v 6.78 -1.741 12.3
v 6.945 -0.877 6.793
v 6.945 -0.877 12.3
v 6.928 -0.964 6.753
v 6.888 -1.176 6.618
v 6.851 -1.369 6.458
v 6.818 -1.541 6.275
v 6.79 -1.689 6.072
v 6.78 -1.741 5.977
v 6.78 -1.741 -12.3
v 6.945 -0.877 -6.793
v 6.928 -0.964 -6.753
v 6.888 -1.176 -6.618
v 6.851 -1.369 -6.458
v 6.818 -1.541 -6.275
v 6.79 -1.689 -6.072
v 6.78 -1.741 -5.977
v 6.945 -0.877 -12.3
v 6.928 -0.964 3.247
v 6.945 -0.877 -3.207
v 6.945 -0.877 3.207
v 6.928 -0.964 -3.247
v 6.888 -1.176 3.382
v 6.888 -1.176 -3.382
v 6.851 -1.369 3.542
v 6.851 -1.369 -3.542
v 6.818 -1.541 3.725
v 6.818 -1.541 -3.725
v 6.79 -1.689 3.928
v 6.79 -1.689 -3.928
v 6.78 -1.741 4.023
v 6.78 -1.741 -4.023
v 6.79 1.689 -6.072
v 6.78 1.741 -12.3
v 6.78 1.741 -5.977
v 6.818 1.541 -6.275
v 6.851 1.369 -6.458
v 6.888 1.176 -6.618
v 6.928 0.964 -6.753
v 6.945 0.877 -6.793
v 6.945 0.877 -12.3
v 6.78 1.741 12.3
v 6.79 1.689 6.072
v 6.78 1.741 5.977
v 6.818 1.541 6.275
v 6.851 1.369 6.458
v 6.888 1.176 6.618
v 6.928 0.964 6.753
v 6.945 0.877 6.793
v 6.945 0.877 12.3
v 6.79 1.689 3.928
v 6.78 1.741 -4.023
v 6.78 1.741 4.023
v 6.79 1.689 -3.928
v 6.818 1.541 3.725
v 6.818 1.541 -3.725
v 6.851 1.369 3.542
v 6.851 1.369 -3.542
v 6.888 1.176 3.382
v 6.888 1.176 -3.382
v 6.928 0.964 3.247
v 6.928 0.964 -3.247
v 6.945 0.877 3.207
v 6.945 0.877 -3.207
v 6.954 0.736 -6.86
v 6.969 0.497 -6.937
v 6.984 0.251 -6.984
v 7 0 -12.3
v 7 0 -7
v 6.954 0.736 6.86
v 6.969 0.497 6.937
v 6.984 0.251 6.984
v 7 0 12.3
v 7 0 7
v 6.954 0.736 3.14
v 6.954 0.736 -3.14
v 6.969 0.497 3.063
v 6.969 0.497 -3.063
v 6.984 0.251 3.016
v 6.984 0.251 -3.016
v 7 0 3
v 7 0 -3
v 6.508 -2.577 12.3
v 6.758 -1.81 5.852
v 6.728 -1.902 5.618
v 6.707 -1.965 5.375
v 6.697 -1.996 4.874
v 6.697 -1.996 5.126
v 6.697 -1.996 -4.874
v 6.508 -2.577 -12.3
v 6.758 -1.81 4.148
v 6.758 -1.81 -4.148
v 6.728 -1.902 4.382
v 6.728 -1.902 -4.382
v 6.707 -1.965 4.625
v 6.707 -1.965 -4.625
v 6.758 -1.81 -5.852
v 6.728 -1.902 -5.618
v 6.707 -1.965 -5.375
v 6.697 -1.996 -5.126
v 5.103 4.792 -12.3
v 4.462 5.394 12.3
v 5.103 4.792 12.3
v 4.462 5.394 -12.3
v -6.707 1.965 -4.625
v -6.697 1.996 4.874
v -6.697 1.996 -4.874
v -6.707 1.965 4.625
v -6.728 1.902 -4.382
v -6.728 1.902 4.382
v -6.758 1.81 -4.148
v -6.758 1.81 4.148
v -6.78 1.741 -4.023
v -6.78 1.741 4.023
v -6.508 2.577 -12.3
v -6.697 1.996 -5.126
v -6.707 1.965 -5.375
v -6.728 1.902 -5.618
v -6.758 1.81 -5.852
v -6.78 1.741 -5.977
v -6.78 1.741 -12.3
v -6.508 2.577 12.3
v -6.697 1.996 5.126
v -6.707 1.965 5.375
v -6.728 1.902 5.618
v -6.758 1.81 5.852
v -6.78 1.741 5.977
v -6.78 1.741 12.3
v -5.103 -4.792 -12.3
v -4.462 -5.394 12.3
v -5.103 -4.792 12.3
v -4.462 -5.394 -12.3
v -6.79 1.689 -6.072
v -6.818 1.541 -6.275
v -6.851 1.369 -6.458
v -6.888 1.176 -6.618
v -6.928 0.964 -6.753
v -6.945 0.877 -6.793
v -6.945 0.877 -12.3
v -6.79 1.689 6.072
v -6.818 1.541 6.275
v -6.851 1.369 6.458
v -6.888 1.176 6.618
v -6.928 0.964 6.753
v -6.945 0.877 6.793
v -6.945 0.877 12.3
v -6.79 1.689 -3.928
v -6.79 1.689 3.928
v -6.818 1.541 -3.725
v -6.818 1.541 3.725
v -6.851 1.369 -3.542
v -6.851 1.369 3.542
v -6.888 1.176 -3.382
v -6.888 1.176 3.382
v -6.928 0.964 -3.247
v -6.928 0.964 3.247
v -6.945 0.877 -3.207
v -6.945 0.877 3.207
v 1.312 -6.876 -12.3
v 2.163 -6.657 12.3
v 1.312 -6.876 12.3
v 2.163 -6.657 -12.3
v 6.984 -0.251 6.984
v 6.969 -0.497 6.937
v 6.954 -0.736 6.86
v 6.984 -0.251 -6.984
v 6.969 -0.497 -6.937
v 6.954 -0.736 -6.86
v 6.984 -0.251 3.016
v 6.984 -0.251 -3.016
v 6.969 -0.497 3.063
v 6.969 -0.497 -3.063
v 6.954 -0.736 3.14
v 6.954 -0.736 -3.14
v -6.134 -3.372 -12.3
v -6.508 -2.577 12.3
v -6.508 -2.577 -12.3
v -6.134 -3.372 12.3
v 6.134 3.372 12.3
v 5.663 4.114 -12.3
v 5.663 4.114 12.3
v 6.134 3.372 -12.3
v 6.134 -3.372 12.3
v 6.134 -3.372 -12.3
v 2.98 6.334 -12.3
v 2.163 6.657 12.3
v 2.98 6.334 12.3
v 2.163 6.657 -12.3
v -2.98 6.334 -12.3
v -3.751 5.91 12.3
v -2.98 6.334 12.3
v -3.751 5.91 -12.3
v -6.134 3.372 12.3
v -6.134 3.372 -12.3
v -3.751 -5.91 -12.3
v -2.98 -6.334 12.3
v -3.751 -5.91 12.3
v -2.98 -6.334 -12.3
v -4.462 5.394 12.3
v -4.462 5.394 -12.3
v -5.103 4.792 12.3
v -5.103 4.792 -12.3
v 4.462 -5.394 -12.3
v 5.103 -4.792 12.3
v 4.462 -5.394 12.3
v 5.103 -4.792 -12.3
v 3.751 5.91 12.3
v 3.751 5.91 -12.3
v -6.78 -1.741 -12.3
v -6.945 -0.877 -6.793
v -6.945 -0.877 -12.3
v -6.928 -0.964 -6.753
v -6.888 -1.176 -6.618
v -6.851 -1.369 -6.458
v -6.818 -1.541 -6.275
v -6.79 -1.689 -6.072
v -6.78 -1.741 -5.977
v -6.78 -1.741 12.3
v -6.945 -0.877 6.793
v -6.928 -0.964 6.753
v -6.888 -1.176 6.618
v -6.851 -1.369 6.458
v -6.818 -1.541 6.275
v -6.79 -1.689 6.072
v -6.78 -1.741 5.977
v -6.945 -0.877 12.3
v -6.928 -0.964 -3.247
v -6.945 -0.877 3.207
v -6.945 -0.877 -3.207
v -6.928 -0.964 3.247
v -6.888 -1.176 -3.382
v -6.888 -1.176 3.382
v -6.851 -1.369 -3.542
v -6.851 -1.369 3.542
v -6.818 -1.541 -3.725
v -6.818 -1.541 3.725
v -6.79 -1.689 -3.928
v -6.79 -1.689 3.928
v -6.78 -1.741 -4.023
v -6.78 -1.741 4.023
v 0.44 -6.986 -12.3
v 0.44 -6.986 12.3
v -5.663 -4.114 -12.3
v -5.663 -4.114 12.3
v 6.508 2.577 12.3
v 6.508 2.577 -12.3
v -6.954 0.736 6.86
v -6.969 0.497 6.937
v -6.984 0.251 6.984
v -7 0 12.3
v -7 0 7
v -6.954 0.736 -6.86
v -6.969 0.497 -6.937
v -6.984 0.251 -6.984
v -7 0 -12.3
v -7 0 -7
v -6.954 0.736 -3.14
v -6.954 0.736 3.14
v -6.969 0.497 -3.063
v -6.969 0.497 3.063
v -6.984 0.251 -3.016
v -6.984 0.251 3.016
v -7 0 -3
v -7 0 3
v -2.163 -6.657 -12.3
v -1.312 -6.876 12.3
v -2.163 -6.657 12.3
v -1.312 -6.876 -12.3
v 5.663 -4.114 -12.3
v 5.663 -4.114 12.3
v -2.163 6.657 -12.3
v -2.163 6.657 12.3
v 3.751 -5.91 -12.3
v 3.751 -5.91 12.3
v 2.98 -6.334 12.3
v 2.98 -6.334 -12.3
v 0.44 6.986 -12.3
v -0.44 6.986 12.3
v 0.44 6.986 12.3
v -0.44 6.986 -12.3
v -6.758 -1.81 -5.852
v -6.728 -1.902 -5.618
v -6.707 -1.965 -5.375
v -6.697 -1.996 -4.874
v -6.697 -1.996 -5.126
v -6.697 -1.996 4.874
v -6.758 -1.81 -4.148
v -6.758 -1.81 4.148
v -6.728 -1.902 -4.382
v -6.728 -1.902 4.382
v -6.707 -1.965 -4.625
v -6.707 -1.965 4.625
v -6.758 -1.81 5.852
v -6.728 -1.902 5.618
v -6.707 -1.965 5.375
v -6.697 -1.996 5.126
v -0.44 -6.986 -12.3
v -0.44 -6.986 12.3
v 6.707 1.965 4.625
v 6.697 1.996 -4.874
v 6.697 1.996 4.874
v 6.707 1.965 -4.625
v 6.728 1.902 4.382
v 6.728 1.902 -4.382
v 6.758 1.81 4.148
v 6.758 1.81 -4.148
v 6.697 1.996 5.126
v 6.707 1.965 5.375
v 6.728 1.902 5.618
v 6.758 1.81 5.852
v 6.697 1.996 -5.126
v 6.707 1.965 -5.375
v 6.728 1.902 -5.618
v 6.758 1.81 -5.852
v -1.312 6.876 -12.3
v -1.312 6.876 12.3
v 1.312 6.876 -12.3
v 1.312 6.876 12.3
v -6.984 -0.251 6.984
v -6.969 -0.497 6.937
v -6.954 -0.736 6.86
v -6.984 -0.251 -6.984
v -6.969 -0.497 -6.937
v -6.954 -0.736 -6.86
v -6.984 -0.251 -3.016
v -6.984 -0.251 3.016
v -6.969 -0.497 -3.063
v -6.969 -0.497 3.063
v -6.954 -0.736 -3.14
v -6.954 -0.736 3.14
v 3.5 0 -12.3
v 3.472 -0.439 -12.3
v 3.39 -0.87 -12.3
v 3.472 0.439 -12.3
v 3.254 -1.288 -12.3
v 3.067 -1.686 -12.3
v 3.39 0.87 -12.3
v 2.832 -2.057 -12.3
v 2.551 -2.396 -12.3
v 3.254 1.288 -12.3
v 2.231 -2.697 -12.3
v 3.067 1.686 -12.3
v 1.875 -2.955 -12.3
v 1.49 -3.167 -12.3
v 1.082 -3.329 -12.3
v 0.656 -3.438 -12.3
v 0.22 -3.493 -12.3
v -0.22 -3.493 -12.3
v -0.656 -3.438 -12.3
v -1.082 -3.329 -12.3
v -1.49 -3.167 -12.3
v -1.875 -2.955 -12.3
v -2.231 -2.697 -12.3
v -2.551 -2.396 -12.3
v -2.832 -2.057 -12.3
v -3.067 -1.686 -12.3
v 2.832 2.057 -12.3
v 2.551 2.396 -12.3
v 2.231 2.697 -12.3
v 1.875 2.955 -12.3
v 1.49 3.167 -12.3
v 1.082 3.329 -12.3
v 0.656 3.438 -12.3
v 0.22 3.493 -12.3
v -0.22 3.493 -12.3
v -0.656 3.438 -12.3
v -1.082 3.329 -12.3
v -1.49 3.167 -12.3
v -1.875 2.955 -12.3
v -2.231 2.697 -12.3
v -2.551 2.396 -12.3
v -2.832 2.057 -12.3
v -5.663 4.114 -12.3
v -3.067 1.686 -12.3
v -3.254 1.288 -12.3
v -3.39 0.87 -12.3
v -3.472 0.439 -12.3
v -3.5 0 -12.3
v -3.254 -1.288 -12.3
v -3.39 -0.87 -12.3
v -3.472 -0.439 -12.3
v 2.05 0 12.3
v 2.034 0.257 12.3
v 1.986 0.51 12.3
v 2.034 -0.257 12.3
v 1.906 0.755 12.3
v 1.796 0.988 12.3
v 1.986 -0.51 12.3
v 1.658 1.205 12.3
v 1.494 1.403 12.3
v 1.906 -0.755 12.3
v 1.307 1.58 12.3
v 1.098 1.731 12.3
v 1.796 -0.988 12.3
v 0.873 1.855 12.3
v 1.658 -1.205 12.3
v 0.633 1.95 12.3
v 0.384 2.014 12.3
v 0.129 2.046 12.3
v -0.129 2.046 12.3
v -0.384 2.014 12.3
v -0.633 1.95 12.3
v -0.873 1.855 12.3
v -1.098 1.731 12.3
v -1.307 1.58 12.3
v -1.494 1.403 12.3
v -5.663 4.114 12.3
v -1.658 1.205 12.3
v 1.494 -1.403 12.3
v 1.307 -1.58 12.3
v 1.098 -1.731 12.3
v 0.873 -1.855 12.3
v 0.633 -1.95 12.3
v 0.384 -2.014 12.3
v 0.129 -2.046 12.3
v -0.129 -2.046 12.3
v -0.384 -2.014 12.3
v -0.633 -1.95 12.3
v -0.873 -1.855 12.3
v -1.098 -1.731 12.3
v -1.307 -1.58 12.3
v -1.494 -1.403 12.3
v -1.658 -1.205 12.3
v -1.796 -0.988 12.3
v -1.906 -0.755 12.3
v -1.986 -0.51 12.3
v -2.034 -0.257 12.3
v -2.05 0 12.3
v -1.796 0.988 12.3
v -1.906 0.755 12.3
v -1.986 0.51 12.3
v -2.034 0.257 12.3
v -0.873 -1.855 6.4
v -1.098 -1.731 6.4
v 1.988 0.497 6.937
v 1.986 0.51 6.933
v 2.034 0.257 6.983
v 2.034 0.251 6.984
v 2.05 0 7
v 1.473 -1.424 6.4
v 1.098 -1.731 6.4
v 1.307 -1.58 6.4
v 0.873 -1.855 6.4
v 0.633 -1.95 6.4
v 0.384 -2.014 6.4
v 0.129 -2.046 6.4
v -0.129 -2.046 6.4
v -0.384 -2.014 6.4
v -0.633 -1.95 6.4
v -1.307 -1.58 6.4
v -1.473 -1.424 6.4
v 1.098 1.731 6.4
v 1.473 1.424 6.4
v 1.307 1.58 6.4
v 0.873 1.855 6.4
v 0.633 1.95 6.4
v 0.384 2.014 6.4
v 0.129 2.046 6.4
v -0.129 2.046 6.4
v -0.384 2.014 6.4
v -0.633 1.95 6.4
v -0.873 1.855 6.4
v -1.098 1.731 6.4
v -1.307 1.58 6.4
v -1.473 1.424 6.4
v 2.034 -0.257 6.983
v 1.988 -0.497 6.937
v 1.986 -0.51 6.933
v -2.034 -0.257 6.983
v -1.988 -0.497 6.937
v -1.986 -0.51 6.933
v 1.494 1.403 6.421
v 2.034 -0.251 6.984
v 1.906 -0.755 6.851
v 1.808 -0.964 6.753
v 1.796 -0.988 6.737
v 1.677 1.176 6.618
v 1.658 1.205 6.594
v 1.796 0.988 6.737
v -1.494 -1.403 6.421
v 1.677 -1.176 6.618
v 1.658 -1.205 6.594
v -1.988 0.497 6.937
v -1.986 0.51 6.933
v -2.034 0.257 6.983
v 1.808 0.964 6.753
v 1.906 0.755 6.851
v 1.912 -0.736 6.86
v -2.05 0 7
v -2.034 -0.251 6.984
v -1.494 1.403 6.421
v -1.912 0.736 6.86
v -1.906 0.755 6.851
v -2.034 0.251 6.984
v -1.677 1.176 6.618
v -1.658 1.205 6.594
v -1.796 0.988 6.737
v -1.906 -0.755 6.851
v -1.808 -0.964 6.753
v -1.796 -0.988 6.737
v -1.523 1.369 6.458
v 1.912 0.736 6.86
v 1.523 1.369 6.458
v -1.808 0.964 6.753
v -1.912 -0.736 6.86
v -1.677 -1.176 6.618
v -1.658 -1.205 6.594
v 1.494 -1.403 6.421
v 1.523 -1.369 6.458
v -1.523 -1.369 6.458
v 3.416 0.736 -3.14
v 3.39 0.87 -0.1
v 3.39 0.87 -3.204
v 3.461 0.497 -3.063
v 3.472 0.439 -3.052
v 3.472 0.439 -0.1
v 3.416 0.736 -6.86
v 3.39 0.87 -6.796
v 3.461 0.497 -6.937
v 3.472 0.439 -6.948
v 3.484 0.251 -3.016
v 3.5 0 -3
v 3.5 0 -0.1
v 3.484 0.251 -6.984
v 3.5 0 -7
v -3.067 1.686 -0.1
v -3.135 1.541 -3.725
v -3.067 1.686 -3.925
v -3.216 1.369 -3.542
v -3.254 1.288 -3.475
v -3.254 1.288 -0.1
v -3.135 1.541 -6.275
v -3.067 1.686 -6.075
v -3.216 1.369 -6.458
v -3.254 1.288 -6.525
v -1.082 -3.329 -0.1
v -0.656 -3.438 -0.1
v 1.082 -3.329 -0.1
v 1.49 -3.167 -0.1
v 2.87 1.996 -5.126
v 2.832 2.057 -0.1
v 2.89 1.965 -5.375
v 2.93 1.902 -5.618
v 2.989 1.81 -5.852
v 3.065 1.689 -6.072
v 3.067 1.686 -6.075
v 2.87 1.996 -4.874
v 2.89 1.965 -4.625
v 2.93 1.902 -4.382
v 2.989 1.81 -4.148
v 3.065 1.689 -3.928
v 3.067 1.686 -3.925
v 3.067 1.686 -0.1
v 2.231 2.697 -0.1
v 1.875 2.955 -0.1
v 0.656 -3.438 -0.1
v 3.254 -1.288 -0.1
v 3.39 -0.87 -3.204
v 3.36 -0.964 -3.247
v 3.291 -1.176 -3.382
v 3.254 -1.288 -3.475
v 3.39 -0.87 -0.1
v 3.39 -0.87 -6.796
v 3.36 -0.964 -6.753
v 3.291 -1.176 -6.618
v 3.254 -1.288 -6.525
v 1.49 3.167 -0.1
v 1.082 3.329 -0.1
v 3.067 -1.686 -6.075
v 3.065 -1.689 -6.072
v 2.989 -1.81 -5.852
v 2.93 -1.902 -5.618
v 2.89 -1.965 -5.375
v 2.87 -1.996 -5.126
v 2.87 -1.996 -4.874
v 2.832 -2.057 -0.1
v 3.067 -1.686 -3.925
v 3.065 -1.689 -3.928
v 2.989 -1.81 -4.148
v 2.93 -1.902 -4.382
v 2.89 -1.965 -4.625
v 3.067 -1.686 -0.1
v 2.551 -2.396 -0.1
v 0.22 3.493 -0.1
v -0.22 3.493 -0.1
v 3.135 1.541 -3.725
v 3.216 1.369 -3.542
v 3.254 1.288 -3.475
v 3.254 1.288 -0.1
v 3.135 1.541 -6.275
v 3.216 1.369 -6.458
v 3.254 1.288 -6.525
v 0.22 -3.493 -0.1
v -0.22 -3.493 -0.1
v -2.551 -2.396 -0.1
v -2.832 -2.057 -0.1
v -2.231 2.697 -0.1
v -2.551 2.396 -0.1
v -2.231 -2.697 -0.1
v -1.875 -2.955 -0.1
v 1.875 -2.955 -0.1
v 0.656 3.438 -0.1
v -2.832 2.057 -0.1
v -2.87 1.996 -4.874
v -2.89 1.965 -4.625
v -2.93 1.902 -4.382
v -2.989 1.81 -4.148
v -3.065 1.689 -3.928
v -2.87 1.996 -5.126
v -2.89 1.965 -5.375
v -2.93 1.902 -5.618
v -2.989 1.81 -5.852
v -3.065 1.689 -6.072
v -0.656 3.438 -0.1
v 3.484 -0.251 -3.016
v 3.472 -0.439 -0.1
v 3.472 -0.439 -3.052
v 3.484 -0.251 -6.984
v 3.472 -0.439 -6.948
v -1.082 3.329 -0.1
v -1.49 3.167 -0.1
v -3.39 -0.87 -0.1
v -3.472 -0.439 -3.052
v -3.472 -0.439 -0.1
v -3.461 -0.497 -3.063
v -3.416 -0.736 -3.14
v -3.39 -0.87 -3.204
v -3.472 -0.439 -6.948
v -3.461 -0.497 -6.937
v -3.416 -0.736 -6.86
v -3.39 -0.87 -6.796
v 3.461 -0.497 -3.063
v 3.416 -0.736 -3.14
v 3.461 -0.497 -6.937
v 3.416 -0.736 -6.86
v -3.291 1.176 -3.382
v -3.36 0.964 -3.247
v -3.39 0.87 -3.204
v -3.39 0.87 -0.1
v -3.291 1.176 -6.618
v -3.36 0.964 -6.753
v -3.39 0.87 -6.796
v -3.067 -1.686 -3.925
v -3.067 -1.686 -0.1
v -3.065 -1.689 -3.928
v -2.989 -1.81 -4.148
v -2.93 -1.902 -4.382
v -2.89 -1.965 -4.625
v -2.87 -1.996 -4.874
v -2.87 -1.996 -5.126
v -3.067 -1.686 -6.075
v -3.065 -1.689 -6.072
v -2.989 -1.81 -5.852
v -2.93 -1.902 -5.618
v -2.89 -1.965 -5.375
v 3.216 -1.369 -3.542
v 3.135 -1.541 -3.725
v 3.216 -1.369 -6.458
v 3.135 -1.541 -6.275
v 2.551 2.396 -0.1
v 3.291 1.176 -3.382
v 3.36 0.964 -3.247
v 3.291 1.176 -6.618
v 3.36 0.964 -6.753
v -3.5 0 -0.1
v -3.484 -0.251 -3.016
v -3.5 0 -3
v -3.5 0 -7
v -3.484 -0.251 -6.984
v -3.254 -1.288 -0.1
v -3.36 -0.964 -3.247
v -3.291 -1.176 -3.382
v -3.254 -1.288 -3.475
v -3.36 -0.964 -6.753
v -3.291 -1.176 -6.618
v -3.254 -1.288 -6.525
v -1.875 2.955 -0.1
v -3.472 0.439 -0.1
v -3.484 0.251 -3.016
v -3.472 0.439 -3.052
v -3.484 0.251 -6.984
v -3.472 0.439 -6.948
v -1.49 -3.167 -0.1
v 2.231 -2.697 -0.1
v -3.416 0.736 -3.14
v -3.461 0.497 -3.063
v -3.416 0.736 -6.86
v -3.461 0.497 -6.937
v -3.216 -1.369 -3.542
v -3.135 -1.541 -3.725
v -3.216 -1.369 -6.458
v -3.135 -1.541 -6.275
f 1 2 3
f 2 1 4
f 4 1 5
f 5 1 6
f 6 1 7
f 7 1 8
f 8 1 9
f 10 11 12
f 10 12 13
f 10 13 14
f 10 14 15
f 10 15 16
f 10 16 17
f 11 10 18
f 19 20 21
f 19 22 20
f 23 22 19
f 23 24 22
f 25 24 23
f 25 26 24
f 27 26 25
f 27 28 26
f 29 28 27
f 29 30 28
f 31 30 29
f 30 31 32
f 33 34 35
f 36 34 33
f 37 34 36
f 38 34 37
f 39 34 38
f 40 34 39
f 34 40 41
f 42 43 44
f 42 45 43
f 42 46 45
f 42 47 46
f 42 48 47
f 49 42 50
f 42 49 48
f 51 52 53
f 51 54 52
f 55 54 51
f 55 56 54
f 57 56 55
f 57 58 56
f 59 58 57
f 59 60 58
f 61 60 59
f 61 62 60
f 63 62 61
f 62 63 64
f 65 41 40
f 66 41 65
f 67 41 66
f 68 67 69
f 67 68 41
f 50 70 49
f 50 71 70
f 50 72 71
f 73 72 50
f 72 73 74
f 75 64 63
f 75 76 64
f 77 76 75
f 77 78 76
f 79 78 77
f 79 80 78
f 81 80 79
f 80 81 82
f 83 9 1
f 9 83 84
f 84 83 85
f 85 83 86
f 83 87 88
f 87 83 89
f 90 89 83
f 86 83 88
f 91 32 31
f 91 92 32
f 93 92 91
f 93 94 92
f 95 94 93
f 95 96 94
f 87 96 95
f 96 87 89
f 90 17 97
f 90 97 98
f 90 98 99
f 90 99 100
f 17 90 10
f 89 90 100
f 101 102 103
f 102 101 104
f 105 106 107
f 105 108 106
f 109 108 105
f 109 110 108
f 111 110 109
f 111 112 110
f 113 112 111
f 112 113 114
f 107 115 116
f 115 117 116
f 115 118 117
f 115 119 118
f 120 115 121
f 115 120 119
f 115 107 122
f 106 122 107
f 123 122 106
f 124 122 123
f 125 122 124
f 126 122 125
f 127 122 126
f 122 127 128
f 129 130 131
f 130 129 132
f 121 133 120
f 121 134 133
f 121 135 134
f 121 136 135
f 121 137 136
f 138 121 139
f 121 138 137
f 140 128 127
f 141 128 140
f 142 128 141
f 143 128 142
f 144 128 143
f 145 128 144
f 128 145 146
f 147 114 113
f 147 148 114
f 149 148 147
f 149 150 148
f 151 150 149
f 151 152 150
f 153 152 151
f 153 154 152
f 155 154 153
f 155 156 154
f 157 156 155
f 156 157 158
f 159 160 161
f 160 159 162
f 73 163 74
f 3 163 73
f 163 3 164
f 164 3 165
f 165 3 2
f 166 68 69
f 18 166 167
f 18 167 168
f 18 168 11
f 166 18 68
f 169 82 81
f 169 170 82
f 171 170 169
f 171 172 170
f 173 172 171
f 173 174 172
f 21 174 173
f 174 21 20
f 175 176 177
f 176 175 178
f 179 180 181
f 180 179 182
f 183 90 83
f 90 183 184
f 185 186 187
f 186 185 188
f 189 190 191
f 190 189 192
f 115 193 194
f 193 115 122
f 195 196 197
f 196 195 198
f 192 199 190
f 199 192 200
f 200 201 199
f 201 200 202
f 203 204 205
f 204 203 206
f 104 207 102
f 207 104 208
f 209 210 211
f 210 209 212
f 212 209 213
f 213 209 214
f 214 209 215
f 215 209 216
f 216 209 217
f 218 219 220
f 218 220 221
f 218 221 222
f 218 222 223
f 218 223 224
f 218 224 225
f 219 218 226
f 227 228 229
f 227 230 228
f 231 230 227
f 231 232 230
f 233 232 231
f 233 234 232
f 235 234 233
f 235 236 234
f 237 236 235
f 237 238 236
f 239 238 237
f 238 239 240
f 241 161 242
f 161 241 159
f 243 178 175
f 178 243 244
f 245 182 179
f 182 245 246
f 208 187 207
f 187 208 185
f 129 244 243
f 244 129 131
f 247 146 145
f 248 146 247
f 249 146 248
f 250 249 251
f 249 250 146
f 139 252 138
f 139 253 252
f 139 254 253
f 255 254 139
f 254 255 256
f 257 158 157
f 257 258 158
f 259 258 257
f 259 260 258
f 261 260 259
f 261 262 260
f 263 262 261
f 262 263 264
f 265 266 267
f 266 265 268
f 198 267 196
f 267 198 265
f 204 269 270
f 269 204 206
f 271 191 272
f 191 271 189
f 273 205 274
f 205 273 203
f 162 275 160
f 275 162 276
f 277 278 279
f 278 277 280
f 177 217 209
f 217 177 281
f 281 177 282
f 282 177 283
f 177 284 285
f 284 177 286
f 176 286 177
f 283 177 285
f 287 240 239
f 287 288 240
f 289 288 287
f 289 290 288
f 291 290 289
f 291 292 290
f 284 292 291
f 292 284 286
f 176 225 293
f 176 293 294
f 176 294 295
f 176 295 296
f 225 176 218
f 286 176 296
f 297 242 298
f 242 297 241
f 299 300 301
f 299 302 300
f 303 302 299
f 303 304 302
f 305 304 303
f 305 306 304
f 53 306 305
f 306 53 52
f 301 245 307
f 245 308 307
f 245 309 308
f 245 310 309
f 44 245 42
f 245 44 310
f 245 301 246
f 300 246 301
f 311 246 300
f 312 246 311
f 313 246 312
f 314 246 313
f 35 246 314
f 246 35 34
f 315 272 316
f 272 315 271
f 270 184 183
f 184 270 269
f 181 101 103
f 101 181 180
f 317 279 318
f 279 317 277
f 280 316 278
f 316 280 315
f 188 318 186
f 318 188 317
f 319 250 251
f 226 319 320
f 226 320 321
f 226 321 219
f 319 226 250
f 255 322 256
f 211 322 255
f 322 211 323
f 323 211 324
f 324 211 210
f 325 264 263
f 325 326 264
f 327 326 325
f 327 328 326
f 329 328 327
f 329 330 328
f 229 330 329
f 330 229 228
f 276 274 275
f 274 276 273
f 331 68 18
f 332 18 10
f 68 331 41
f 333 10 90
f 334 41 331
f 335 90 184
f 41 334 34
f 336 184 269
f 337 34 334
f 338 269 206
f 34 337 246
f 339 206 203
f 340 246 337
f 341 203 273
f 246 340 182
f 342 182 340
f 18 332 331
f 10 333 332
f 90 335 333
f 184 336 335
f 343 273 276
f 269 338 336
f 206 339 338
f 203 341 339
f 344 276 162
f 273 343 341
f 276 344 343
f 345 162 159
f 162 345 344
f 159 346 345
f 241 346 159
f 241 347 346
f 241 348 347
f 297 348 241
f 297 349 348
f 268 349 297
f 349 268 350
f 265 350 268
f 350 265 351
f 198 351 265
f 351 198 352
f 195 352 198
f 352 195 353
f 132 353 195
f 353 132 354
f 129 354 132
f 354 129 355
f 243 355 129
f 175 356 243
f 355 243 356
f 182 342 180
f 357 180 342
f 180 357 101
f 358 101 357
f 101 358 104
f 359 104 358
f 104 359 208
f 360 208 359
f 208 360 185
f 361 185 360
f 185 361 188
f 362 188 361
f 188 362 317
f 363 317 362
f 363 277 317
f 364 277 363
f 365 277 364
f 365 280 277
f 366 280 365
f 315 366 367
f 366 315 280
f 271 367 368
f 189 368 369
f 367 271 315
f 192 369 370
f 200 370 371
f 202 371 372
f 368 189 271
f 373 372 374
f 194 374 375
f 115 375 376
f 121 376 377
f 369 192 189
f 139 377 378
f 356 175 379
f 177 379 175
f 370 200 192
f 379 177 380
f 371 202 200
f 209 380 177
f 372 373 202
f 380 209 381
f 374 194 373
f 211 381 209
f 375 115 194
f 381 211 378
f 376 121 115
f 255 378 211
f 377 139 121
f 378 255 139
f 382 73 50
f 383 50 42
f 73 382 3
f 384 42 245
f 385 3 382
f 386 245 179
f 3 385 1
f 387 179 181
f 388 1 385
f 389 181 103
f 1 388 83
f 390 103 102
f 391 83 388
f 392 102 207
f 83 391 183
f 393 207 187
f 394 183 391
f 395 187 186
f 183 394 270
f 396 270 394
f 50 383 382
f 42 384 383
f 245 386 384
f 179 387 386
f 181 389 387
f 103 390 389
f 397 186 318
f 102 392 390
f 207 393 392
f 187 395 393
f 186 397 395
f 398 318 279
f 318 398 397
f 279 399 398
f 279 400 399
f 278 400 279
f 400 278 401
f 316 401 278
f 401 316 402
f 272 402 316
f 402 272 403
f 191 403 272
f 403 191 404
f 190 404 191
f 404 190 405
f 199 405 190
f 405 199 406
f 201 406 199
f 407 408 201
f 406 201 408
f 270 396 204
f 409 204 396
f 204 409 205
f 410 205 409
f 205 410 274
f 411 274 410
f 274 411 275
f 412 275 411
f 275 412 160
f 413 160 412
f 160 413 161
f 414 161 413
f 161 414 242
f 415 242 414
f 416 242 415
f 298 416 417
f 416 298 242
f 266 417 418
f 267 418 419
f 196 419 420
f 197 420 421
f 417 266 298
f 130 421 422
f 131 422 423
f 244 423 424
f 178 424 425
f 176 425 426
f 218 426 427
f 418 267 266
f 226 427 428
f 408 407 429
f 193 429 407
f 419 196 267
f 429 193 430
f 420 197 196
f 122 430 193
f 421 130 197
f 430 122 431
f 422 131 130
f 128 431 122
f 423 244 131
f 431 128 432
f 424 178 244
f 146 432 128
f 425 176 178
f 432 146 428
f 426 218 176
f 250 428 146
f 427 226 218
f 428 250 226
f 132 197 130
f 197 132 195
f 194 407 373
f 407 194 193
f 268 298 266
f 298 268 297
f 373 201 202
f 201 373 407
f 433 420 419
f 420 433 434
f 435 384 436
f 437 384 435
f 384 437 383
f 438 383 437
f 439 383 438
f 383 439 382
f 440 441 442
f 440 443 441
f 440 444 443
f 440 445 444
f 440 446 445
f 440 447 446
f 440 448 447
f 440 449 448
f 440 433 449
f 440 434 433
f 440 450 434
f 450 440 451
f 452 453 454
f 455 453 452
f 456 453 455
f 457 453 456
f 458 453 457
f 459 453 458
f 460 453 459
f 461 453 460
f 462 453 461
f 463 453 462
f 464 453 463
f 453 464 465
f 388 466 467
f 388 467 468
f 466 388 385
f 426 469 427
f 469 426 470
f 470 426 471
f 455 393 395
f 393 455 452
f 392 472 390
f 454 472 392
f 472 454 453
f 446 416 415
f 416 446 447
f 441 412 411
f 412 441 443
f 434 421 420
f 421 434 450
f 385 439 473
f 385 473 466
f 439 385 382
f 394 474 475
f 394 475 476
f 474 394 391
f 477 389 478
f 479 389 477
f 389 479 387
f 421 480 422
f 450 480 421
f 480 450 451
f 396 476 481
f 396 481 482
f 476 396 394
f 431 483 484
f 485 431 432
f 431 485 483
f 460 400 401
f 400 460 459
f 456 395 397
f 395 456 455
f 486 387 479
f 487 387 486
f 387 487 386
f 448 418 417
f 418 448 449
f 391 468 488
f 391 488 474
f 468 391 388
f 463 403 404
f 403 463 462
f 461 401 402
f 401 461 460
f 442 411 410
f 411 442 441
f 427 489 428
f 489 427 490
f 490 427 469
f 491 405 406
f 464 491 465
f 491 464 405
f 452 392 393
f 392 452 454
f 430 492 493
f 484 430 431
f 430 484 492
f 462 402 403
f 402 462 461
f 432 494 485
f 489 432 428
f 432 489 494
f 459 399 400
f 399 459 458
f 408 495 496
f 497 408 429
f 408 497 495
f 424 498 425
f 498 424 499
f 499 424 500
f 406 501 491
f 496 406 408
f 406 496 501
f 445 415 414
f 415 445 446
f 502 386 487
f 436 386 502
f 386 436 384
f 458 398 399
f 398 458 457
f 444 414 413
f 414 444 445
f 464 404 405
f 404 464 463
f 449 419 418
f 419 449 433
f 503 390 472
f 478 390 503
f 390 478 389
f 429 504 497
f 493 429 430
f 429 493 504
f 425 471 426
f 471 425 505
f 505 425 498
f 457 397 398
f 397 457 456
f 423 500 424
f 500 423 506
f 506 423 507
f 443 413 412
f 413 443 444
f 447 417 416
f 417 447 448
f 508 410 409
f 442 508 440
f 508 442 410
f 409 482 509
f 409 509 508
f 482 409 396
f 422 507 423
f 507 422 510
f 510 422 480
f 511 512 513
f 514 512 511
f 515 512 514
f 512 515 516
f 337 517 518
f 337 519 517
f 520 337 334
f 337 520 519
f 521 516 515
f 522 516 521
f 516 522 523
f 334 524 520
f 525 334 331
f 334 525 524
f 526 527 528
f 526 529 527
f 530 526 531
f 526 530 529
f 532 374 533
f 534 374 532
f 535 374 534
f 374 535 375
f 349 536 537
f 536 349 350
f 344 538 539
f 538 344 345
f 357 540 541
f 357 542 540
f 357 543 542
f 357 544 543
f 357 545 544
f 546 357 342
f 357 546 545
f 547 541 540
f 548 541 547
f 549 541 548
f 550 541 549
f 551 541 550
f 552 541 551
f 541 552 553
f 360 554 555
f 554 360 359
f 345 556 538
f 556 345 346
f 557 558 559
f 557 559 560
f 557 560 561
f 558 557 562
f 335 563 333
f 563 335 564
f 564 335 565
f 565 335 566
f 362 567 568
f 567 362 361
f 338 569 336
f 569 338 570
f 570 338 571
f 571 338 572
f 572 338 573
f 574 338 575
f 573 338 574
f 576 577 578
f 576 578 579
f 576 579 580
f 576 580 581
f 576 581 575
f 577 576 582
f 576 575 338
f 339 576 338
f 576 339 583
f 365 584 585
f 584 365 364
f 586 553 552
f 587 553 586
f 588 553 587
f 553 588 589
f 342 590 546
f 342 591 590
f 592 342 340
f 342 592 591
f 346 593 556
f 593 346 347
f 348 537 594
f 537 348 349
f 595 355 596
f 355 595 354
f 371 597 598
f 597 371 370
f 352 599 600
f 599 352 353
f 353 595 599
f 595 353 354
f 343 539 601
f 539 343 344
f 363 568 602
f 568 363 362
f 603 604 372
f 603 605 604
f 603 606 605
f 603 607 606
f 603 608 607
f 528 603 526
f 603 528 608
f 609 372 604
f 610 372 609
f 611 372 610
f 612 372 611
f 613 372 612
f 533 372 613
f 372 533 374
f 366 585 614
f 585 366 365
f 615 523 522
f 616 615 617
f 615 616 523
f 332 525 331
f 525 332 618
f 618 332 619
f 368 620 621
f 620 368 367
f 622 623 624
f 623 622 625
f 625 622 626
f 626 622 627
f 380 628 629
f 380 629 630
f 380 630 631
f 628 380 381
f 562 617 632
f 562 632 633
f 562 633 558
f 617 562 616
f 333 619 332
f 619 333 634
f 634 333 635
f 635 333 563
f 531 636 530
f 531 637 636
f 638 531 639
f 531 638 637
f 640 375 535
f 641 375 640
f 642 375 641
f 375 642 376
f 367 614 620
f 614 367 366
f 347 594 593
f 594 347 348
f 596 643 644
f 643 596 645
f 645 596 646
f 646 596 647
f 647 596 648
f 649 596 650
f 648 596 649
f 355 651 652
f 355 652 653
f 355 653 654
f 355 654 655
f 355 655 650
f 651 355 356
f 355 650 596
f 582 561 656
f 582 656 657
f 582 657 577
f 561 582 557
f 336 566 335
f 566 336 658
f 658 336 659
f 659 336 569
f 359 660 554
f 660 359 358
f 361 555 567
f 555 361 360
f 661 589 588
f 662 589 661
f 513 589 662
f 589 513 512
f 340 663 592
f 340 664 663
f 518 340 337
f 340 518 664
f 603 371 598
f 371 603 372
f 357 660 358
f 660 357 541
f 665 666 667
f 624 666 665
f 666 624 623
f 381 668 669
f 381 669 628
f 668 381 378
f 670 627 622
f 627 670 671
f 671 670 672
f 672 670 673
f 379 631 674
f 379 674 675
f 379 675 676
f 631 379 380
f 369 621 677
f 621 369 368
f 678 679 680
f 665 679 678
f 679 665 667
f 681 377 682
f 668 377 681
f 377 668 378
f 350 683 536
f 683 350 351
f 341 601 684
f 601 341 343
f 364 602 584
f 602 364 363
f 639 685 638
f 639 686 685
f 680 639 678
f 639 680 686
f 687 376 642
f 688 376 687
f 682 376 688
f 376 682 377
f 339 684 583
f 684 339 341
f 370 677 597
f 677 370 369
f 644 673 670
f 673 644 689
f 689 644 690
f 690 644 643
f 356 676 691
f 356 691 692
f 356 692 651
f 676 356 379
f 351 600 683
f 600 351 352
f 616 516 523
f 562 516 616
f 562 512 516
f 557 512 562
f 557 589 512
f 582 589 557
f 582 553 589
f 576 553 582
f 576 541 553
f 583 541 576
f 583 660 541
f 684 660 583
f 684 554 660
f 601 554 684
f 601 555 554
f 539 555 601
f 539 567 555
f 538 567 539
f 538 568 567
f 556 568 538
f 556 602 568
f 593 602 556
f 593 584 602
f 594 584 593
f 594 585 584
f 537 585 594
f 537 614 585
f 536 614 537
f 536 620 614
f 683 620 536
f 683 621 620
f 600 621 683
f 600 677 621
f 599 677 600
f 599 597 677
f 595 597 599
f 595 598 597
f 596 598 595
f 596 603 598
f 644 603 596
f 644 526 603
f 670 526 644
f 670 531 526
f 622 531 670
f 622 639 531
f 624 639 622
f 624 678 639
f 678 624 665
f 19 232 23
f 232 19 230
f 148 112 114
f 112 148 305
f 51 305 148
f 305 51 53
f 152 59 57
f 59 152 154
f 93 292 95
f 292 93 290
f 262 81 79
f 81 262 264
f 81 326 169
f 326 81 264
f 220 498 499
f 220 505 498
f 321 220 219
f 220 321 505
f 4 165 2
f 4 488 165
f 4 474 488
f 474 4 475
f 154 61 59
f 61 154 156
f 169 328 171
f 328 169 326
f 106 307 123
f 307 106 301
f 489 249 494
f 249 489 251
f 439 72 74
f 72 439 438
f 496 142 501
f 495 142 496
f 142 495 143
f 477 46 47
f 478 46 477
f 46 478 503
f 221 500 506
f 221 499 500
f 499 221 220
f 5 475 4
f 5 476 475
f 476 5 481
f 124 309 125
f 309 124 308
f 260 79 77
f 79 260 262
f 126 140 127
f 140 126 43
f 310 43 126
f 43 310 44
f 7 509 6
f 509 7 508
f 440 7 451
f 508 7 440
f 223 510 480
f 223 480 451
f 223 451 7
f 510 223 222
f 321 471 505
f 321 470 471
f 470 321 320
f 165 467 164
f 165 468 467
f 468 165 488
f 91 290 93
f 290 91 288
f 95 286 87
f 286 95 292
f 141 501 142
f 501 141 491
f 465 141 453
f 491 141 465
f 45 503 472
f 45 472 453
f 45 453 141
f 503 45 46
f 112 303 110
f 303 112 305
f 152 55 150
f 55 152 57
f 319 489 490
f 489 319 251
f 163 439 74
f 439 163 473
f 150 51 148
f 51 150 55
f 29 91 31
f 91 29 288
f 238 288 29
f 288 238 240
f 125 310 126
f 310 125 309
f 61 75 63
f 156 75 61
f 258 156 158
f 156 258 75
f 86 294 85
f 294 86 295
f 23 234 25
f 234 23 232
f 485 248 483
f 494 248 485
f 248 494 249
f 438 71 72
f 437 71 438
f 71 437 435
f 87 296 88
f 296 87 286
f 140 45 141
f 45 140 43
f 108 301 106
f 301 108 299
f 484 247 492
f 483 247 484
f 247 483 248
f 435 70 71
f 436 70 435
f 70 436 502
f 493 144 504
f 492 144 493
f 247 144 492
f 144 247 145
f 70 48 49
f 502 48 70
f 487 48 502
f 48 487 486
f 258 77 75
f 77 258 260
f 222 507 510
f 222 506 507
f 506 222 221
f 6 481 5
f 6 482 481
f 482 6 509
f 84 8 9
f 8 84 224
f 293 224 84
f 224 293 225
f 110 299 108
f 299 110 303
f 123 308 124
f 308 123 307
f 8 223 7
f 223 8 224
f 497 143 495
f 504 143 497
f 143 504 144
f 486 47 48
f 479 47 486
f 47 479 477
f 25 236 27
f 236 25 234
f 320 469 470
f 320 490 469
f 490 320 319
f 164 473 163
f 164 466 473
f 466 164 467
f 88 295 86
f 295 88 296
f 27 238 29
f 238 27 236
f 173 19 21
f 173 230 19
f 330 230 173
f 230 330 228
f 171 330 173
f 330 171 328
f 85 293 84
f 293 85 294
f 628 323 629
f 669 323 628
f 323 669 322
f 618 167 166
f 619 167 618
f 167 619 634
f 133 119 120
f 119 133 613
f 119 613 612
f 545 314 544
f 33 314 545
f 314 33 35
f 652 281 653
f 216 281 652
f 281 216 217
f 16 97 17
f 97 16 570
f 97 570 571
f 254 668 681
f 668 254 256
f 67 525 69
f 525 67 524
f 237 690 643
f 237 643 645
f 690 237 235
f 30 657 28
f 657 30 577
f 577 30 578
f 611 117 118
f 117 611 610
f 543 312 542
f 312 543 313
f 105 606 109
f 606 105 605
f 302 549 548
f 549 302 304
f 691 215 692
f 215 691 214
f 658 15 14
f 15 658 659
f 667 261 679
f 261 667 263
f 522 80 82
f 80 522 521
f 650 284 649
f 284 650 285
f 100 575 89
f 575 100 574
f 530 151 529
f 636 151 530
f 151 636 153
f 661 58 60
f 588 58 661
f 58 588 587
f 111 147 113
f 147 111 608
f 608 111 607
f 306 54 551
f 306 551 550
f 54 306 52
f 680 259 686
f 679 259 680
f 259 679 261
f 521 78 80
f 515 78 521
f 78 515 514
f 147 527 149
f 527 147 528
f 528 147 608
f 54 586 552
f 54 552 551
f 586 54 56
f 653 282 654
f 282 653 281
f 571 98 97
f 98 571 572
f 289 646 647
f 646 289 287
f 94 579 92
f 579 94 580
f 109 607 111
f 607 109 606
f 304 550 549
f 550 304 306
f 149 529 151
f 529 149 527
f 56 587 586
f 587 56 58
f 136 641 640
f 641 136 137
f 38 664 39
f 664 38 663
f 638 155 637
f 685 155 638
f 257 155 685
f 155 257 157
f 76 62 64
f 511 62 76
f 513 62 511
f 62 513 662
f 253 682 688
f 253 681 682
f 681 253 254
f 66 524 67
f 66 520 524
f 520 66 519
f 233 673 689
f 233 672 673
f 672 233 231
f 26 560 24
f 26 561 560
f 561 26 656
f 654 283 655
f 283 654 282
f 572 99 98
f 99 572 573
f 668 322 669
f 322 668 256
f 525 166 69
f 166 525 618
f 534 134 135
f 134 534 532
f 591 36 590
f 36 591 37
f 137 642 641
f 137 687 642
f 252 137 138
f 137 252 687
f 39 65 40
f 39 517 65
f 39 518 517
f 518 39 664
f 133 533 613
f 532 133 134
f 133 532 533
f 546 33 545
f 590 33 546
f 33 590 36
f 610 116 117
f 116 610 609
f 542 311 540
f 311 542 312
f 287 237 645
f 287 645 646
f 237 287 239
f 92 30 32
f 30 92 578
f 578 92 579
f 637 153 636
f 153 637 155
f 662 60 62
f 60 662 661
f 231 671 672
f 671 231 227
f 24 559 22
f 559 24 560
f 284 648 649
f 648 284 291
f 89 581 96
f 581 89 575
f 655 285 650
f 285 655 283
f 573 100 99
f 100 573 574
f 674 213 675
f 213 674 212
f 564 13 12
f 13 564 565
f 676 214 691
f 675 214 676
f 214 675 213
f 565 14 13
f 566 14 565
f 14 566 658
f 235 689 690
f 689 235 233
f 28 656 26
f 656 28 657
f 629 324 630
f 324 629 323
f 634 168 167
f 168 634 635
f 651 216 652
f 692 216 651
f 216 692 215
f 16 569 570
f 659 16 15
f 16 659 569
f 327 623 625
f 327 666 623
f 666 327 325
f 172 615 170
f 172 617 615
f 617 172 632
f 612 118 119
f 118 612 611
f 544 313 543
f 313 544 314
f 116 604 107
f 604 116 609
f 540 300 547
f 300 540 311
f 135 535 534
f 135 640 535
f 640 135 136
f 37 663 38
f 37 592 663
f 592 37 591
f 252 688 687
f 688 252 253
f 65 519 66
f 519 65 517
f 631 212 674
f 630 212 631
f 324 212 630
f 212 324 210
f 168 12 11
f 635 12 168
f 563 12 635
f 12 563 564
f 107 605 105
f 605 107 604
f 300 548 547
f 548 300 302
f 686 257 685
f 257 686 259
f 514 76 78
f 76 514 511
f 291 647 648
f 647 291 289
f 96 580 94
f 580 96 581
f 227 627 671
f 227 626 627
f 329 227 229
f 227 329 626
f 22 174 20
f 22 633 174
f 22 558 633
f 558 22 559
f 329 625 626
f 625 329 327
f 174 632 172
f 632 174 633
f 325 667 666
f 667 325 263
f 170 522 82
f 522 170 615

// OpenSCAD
// file: ../robot_settings.scad
main_box_x = 95; // 96
main_box_y = 102;
main_box_z = 74; // 74.5
wall_thickness = 2;

rail_gap = 2;
rail_inset = 7;

rail_thickness = 7;
rail_length = 250;
rail_width = 200;

raspberry_pi_screw_seperation_y = 57;
raspberry_pi_screw_seperation_z = 48;
raspberry_pi_peg_h = 4;

gears_module = 1;
pinion_gear_teeth = 30;
pinion_gear_width = 5;
pinion_gear_bore = 4;

gears_setback_distance = 25;
gear_post_height = 2 * pinion_gear_width + rail_thickness + 8 ;

steering_motor_mount_x = 45;
steering_motor_mount_y = 36;
steering_motor_mount_z = 18;
steering_motor_mount_setback_distance = gears_setback_distance + 16;

dc_motor_drivertype = "Teyleten"; // Teyleten
isAdafruit = (dc_motor_drivertype == "Adafruit");

drv8871_x = isAdafruit ? 20.3 : 21.6;
drv8871_y = isAdafruit ?  24 : 25;

drv8871_z = 2;
drv8871_screw_d = 2.5;
drv8871_solder_points_z = 2;

drv8871mount_edge_x = 1.5;
drv8871mount_edge_wall = 3;
drv8871mount_z = 5;
drv8871mount_x = drv8871_x +  drv8871mount_edge_wall - 2* drv8871mount_edge_x;
drv8871mount_y = 19;

drv8871_screw_distance = 15.64;
drv8871_solder_points_d = 1.66;
drv8871_solder_offset_y = 4.4;
drv8871_solder_inner_points_distance = 5;
drv8871_solder_outer_points_distance = 12;

dc_motor_housing_minus_encoder_z = 48;
dc_motor_encoder_z = 9.33;
dc_motor_encoder_wheel_d = 13.4;
dc_motor_encoder_wheel_thickness = 5;
dc_motor_encoder_wheel_gap = 3;
dc_motor_encoder_circuit_thickness = 2;
dc_motor_cutout_d = 24.8;
dc_motor_cutout_z = 19.5;

dc_motor_screw_head_z = 2;
dc_motor_screw_head_d = 5.6;
dc_motor_screw_d = 3.2;
dc_motor_screw_offset = 8.5;

dc_motor_axle_ring_z = 3;
dc_motor_axle_ring_d = 7.2;
dc_motor_axle_cutout_d = 4.5;
dc_motor_axle_cutout_z = 10;
dc_motor_axle_notch_cutout = 0.4;
dc_motor_axle_notch_cutout_z = 6;

pdmount_x = 20;
pdmount_y = 30;
pdmount_z = 2;
pdmount_edge_x = 1.5;
pdmount_edge_wall = 3;

steering_shaft_z = 45;
steering_shaft_d = 7;
steering_shaft_motor_fitting_d = 9;
coupler_length = 24.6;
coupler_diameter = 14;
coupler_screw_d = 4;
coupler_screw_z_offset = 5;
coupler_gear_side_insert = 12.6;
steering_shaft_with_coupler_z = steering_shaft_z - coupler_gear_side_insert;

lidar_mount_y = 110;
lidar_mount_x = 65 + 20;
lidar_narrow_screws = 40;
lidar_wide_screws = 56;
lidar_front_to_back_screws = 70;
lidar_screw_d = 3;
lidar_circuitboard_x = 20;
lidar_circuitboard_y = 35;
lidar_circuitboard_z = 1.2;
lidar_cord_length = 29;

ball_bearing_height = 7;
ball_bearing_outer_diameter = 22;
ball_bearing_inner_diameter = 8;

pull_bar_radius = 3.3;

rack_module = 1;
rack_length = main_box_x / 2;
rack_height = 10;
rack_width = 10;
rack_teeth = 30;
rack_bore = 3;

// tire hardware
axle_length = 30;
axle_reciever_inner_diameter = 7.75;
axle_reciever_length = 18.8;
axle_notch_length = 7;
axle_notch_cutout = 2.4;

// power distribution bar
power_bar_cutout_x = 96;
power_bar_y = 19.1;
power_bar_z = 1.5;
power_bar_screw_distance = 91.4;
power_bar_screw_d = 2.8;
power_bar_standoff_z = 5;
power_bar_standoff_d = 6.83;

// breadboard
breadboard_wall_thickness = 3;
breadboard_width = 55;
breadboard_length = 83;
breadboard_height = 10.5;
breadboard_notch_width = 3.8;
breadboard_longside_notch_separation = 58.2 - breadboard_notch_width / 2;
breadboard_shortside_notch_separation = 26.3 - breadboard_notch_width;

pico_expander_width = 63;
pico_expander_height = 57;
pico_screw_hole_offset = 3;
pico_screw_hole_d = 2.5;
// main file
$fn = 50;
include <../robot_settings.scad>


  module steering_coupler() {
  color("blue")
  difference() {
    cylinder(h = coupler_length, d = coupler_diameter, center = true);

    // top cutout for motor axle
    translate([0, 0, coupler_length / 2 - dc_motor_axle_notch_cutout_z / 2 + .1])
    cylinder(h = dc_motor_axle_notch_cutout_z, d = dc_motor_axle_cutout_d - dc_motor_axle_notch_cutout, center = true);

    // bottom cutout for steering shaft
    translate([0, 0,  - coupler_gear_side_insert / 2 - .1])
    cylinder(h = coupler_gear_side_insert, d = steering_shaft_d, center = true);

    // top screw cutout
    translate([0, 0, coupler_screw_z_offset])
    rotate([0, 90, 0])
    cylinder(h = coupler_diameter, d = coupler_screw_d, center = true);

    // bottom screw cutout
    translate([0, 0, -coupler_screw_z_offset])
    rotate([0, 90, 0])
    cylinder(h = coupler_diameter, d = coupler_screw_d, center = true);
  }
}


steering_coupler();
